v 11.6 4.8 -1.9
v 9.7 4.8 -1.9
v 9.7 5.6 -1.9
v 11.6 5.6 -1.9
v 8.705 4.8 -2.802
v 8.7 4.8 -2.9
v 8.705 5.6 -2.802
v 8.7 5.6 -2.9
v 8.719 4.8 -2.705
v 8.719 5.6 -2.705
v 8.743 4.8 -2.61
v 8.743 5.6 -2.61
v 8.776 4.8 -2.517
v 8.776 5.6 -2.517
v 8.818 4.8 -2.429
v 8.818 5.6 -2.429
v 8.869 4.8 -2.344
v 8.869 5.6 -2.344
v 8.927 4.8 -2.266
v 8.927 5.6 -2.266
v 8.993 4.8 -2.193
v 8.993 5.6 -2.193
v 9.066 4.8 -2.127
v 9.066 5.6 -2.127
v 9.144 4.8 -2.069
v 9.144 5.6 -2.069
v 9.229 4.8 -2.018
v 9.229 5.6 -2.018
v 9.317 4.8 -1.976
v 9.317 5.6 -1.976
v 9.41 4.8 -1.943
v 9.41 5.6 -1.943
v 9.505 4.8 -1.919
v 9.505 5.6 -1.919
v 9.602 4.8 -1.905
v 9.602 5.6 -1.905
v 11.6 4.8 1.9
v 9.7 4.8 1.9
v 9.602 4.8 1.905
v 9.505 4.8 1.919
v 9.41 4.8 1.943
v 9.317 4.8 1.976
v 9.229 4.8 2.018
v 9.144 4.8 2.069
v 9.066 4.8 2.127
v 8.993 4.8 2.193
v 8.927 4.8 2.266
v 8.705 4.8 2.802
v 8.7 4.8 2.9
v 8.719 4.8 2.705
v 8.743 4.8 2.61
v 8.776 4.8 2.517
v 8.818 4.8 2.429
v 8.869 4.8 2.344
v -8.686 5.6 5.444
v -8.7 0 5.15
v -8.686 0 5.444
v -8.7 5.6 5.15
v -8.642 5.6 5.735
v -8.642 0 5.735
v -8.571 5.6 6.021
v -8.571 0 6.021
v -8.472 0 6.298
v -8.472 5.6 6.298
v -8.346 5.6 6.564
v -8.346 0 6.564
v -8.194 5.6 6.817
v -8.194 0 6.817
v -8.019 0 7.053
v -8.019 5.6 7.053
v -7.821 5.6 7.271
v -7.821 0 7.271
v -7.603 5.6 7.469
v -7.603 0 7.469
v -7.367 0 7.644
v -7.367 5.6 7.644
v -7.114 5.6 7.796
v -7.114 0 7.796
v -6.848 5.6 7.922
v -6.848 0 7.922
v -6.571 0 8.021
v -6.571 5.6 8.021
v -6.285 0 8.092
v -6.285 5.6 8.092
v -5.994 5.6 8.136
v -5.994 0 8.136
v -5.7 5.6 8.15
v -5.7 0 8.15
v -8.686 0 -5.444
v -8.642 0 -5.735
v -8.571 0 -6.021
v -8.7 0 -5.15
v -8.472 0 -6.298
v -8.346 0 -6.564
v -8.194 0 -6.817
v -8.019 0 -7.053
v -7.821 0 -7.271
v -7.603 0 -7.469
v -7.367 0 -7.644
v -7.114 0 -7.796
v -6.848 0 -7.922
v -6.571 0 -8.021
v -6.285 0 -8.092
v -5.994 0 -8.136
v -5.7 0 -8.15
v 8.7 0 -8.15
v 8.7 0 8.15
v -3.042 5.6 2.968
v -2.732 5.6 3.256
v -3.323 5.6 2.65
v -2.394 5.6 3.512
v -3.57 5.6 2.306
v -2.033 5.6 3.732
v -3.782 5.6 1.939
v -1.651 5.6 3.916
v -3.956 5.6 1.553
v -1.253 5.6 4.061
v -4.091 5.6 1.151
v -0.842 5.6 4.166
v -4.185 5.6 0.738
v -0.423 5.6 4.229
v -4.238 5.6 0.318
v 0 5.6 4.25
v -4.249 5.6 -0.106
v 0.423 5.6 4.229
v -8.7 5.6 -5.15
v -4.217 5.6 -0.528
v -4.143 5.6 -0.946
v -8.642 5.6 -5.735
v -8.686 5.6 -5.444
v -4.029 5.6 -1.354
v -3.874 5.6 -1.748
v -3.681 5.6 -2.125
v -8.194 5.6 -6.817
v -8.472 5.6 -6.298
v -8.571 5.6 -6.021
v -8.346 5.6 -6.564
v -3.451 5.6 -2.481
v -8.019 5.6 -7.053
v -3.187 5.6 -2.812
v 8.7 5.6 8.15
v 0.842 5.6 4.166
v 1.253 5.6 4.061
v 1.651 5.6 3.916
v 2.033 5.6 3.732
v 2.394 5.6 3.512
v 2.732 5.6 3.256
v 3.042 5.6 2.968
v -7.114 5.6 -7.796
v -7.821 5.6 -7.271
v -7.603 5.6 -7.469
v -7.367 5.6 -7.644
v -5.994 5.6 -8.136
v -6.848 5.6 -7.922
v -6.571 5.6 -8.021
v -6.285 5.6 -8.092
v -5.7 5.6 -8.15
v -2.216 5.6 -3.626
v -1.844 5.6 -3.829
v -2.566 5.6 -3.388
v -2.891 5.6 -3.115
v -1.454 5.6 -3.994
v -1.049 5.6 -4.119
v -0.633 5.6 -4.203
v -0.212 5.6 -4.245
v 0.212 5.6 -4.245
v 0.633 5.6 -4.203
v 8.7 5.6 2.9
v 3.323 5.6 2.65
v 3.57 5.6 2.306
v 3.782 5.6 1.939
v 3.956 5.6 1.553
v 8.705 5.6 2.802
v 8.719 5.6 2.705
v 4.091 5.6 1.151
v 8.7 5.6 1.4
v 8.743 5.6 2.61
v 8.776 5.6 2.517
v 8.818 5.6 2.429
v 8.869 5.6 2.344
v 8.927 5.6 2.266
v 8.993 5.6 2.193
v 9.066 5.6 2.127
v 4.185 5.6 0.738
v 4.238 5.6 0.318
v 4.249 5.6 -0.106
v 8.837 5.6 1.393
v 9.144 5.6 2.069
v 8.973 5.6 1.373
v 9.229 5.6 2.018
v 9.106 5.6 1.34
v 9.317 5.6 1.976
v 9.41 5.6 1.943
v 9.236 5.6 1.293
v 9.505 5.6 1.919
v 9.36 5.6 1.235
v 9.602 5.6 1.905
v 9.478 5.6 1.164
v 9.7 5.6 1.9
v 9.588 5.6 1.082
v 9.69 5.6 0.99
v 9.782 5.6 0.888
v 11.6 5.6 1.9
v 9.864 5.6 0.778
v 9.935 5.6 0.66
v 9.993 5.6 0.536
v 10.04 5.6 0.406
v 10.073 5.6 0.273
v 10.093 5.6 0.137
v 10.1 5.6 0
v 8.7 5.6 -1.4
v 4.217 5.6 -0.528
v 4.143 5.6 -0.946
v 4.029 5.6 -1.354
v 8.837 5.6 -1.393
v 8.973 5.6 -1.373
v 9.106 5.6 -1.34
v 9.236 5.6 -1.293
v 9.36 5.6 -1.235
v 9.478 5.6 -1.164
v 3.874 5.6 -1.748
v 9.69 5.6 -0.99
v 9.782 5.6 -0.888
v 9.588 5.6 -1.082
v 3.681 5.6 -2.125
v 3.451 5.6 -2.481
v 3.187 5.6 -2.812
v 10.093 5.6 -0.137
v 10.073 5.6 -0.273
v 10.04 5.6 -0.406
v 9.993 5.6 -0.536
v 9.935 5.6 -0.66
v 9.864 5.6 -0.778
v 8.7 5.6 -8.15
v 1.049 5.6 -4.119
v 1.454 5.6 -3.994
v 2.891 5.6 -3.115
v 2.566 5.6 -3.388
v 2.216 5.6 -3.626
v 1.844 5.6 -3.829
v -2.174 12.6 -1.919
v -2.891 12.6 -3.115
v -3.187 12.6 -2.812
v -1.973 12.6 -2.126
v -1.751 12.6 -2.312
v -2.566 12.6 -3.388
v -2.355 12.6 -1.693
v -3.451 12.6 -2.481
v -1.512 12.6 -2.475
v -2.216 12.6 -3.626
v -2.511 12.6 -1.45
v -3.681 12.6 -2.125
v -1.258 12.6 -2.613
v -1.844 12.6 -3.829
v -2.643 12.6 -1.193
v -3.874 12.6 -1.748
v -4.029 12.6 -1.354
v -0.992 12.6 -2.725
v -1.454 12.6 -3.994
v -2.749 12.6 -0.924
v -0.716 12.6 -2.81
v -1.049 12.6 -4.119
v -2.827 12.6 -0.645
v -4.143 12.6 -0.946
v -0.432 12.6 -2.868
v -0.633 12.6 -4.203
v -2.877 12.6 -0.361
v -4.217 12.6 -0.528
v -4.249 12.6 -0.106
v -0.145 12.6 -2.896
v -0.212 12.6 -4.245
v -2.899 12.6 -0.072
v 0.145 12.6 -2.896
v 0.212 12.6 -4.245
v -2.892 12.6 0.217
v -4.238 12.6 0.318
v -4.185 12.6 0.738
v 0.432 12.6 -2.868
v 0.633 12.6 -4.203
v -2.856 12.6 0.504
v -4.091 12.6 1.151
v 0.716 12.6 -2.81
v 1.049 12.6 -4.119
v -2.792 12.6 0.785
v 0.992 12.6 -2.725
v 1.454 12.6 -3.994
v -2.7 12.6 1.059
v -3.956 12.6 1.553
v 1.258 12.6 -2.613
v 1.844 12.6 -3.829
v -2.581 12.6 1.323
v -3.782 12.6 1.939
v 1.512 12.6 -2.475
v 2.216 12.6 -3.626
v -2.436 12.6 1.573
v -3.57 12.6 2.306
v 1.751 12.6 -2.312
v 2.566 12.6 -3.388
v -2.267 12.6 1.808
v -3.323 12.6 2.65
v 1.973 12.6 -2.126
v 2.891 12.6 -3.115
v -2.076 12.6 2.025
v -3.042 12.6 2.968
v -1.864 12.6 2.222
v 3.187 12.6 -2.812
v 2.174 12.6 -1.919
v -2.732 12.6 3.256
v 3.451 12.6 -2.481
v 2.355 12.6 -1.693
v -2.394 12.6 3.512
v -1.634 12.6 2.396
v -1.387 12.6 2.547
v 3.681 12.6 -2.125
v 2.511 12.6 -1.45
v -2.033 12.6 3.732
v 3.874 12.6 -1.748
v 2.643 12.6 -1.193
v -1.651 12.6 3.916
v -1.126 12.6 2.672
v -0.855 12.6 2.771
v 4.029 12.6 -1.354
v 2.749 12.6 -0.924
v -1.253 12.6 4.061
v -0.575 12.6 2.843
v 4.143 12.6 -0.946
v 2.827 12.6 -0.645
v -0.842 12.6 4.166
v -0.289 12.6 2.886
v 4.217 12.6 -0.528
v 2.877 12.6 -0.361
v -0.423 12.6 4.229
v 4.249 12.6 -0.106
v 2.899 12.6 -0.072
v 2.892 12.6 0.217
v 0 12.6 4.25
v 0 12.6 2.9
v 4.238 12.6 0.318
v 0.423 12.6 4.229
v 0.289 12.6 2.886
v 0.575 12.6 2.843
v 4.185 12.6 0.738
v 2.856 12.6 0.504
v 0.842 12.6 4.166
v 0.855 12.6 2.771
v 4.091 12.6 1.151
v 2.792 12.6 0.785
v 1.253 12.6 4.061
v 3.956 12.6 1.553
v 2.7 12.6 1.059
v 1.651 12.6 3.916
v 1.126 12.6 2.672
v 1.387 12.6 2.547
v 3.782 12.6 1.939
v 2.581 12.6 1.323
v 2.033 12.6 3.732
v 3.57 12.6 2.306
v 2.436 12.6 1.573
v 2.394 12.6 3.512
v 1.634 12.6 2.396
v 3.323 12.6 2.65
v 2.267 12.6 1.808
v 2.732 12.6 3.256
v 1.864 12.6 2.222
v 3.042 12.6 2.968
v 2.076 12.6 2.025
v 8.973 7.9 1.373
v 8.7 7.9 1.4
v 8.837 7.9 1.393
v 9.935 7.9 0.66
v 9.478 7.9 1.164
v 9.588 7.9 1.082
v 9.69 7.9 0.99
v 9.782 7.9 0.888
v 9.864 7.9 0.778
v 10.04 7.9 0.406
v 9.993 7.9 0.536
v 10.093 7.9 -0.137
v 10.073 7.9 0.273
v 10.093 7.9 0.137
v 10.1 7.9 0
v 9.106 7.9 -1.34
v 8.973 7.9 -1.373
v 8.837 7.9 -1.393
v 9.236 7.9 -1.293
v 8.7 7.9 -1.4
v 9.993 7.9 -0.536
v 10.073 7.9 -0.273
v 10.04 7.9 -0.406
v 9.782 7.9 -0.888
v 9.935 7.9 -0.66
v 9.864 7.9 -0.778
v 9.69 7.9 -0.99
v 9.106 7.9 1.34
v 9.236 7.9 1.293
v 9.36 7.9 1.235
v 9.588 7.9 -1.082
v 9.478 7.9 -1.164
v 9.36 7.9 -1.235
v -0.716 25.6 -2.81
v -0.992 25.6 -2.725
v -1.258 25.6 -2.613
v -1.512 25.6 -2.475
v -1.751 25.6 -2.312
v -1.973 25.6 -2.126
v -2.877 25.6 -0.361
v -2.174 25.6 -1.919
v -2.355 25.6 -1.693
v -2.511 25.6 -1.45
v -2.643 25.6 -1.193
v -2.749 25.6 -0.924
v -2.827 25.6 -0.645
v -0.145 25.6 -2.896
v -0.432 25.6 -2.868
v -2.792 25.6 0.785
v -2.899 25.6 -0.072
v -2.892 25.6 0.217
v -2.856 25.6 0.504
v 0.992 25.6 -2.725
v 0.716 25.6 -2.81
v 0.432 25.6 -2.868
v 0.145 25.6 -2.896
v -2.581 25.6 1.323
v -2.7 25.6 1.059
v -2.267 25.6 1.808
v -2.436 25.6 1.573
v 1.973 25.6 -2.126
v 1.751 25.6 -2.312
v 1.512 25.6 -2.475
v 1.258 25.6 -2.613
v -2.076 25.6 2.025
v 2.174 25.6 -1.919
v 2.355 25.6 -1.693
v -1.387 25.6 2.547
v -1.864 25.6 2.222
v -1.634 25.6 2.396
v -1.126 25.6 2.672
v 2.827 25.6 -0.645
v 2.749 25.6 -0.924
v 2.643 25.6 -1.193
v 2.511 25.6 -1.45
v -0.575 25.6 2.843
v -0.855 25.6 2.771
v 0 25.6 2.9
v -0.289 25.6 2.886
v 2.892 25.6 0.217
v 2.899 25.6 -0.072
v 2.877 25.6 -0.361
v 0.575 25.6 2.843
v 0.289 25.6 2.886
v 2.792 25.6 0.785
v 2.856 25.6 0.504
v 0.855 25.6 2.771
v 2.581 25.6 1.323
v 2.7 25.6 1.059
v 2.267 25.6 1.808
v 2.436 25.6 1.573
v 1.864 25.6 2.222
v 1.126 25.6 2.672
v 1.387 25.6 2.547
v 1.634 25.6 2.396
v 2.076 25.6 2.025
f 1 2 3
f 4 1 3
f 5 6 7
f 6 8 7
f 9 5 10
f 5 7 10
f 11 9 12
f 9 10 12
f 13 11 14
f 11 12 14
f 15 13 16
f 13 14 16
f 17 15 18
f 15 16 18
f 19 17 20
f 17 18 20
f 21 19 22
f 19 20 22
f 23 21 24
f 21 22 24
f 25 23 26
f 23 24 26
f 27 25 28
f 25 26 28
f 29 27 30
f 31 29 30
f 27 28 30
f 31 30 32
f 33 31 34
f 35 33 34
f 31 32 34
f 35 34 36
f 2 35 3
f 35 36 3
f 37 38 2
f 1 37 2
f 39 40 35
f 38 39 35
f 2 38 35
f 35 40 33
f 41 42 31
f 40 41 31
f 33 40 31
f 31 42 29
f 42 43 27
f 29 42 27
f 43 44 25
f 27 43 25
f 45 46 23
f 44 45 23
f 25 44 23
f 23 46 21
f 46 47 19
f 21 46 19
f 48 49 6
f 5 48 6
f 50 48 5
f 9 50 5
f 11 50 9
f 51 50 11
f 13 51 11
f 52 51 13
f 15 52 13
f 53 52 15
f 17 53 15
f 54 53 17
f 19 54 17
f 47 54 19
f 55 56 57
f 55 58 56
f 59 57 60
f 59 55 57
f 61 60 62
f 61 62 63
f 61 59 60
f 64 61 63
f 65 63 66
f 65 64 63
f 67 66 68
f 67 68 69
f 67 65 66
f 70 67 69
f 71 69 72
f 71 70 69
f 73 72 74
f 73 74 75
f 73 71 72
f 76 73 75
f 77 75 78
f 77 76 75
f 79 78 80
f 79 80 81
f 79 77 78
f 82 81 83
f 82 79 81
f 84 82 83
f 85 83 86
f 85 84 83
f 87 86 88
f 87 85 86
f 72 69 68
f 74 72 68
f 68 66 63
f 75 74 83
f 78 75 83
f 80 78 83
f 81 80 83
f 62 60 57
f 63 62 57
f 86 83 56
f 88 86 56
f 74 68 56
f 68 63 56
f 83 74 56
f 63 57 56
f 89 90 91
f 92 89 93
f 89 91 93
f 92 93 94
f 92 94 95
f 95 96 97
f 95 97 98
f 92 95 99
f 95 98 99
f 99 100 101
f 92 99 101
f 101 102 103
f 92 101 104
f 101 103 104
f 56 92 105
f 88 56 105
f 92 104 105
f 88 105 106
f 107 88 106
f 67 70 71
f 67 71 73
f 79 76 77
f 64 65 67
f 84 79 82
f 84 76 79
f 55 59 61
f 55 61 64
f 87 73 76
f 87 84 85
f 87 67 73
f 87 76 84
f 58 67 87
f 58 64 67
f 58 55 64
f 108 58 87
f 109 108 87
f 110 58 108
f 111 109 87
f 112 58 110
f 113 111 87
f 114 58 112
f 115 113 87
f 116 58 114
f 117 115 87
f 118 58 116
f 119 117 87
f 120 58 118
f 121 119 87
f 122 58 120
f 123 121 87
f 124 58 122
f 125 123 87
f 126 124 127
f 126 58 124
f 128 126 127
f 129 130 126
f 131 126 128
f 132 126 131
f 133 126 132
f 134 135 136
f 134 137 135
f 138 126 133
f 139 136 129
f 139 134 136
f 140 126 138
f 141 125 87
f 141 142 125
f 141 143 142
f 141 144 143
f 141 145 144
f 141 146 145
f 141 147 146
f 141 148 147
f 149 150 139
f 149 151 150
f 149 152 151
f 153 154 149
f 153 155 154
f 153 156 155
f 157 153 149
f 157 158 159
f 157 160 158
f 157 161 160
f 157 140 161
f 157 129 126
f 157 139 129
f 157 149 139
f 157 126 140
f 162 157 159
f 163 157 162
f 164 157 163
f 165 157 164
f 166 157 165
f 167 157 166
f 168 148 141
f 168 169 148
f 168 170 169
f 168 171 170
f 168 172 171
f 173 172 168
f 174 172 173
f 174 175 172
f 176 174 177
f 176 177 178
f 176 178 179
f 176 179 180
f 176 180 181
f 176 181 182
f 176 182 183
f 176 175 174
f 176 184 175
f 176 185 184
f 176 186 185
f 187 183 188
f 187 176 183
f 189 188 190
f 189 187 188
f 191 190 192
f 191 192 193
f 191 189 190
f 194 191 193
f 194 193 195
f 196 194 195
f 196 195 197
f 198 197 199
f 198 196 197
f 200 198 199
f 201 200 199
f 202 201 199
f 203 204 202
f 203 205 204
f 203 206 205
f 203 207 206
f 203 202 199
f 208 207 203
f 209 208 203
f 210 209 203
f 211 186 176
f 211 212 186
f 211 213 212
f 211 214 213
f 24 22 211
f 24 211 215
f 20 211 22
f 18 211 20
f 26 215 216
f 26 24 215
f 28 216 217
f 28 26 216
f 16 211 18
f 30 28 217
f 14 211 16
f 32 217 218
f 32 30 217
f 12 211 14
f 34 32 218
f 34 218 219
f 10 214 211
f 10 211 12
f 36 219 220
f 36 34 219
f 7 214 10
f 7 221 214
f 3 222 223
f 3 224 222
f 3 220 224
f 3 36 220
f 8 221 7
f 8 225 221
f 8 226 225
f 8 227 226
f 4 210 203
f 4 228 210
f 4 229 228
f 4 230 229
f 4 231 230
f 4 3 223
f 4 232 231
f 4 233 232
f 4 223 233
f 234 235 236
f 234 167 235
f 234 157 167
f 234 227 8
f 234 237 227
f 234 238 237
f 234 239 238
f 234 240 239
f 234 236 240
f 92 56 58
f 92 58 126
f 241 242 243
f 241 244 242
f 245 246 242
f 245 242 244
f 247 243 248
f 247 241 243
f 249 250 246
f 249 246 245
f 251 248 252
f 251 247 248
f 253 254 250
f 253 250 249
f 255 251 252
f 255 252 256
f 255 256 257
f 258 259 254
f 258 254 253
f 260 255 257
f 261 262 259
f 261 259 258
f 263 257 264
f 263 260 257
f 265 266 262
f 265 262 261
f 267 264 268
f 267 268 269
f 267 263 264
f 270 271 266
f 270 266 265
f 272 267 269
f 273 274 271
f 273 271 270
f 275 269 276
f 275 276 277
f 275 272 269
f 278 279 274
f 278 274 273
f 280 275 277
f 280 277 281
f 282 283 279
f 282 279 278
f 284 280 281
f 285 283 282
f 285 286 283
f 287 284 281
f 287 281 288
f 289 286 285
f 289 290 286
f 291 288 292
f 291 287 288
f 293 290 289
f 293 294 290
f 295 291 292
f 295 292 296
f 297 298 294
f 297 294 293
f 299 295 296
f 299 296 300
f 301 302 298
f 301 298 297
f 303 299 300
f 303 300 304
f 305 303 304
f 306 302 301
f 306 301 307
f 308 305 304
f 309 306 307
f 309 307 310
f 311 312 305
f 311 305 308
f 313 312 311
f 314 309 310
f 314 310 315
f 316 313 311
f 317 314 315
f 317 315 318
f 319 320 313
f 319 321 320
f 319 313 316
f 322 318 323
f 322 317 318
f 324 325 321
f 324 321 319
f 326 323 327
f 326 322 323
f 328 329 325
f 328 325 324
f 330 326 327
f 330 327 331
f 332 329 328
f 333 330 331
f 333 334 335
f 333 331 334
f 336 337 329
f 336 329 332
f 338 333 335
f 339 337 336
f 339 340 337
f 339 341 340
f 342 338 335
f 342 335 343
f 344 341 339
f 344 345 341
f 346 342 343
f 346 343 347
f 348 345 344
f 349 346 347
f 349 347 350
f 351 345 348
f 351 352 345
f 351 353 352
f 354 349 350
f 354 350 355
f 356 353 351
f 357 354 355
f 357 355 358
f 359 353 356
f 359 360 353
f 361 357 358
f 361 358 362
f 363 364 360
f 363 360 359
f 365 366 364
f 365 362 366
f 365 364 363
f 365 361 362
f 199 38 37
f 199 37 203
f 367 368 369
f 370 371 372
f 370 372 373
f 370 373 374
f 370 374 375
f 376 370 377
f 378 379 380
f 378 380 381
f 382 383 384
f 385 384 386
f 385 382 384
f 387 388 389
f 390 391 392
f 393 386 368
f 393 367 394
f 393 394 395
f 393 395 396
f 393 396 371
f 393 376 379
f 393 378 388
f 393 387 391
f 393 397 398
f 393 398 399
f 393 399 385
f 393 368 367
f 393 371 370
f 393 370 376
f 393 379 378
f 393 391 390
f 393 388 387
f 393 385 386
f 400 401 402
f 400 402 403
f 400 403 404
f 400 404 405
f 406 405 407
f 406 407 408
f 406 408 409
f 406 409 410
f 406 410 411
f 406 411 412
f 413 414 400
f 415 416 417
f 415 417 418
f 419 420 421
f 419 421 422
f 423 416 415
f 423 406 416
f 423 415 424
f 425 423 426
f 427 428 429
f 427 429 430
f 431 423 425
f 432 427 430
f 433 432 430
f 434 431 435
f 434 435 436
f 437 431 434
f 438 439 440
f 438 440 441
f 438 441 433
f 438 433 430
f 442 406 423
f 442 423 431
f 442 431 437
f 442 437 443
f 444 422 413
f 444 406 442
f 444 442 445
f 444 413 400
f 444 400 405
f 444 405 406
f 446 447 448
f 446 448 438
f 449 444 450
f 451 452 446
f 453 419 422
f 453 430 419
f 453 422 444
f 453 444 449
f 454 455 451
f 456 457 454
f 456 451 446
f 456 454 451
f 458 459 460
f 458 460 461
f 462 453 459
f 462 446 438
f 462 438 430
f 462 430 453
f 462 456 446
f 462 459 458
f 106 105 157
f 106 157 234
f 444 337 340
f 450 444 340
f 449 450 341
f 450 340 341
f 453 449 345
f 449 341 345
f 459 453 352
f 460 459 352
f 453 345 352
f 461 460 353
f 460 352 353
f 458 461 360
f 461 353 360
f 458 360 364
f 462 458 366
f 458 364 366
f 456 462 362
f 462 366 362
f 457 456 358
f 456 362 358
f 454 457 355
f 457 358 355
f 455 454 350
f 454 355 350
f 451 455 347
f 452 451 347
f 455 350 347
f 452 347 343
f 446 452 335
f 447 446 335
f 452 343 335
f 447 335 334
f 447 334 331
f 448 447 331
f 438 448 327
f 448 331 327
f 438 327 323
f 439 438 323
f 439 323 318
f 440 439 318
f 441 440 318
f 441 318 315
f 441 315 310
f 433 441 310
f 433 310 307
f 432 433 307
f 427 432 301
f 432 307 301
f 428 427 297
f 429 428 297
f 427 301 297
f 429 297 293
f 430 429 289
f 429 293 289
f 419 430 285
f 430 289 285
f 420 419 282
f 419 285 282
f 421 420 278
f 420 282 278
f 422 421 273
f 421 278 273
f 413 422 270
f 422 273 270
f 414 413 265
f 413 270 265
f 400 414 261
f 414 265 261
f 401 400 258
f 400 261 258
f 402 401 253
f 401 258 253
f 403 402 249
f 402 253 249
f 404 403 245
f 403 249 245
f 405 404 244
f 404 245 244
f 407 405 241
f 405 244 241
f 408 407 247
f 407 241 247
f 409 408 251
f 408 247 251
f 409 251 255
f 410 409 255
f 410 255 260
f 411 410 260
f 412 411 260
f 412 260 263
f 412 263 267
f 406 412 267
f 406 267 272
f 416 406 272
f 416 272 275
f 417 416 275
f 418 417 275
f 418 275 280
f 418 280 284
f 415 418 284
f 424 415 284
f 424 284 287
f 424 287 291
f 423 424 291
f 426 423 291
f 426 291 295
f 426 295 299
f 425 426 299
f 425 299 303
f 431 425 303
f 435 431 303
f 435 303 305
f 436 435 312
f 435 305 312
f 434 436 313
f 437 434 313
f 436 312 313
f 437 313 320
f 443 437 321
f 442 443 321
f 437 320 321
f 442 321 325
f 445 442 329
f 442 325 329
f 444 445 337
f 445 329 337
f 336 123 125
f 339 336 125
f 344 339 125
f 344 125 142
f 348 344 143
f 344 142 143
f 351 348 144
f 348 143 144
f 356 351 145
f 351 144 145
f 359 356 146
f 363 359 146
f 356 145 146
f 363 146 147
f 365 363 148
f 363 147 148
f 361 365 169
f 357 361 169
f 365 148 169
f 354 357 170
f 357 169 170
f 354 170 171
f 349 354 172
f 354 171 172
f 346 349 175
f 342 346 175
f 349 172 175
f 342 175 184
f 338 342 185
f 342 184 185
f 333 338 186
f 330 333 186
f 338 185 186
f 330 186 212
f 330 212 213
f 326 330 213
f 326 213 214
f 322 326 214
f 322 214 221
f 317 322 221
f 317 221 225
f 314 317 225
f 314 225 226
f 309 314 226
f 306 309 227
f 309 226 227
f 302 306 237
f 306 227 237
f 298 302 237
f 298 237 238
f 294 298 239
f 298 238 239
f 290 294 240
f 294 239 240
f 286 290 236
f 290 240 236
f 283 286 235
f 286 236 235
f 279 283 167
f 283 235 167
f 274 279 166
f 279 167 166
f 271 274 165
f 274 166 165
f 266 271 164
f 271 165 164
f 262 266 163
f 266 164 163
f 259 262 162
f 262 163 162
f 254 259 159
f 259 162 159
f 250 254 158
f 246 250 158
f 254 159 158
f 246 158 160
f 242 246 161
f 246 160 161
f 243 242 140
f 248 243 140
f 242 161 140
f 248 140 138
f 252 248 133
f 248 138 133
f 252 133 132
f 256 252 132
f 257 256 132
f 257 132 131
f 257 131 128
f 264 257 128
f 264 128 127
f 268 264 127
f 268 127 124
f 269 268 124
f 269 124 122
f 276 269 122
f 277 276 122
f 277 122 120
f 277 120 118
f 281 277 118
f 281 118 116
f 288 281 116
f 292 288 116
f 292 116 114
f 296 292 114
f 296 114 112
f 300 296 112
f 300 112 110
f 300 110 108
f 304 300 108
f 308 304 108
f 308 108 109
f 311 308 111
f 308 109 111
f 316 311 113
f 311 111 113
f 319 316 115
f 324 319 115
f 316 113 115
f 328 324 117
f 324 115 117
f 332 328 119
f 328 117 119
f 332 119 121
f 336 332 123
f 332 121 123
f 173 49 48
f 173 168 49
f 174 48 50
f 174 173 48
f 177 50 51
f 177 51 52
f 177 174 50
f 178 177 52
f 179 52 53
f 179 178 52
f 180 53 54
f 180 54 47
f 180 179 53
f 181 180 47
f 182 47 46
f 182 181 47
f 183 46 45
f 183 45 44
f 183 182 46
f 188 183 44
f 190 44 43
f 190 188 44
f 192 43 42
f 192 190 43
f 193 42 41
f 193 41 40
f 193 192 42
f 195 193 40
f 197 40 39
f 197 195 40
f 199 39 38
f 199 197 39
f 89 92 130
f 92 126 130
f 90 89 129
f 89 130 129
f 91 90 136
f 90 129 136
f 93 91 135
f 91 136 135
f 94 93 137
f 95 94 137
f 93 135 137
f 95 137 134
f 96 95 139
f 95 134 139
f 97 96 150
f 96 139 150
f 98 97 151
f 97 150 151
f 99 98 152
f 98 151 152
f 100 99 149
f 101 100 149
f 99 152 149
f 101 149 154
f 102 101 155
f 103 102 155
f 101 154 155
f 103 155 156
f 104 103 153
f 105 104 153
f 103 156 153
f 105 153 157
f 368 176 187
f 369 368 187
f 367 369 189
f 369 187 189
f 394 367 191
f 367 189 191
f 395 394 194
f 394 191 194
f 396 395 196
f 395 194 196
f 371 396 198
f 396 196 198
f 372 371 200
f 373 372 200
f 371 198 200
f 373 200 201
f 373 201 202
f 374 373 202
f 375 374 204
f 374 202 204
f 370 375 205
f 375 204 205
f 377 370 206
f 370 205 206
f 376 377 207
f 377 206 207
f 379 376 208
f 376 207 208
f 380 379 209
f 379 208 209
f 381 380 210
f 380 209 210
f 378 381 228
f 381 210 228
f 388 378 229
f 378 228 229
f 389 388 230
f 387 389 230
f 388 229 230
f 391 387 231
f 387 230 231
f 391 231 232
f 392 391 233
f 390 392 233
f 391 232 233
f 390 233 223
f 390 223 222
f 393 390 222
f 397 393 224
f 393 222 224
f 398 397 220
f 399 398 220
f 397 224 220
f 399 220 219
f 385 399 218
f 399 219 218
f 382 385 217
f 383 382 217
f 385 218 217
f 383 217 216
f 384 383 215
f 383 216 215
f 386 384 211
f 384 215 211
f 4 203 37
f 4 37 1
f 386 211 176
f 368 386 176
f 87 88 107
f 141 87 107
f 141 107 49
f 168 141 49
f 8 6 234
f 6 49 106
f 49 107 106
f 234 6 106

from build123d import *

# Parameters (mm, degrees)
SKETCH1_W           = 17.4
SKETCH1_H           = 16.3
BOSS_EXTRUDE1_DEPTH = 5.6
SKETCH2_R           = 4.25
BOSS_EXTRUDE2_DEPTH = 7
SKETCH3_R           = 2.9
BOSS_EXTRUDE3_DEPTH = 13
FILLET1_R           = 3
SKETCH4_W           = 3.8
SKETCH4_H           = 0.8
BOSS_EXTRUDE4_DEPTH = 2.9
FILLET2_R           = 1
BOSS_EXTRUDE5_DEPTH = 2.3


with BuildPart() as part:
    # Sketch1 → Boss-Extrude1 (new body)
    with BuildSketch(Plane(origin=(0, 0, 0), x_dir=(1, 0, 0), z_dir=(0, 1, 0))):
        Rectangle(SKETCH1_W, SKETCH1_H)
    extrude(amount=BOSS_EXTRUDE1_DEPTH)

    # Sketch2 → Boss-Extrude2 (add)
    with BuildSketch(Plane(origin=(0, 5.6, 0), x_dir=(1, 0, 0), z_dir=(0, 1, 0))):
        with Locations(Location((0, 0, 0), (0, 0, 270))):  # turned: the seam where the file's is
            Circle(SKETCH2_R)
    extrude(amount=BOSS_EXTRUDE2_DEPTH)

    # Sketch3 → Boss-Extrude3 (add)
    with BuildSketch(Plane(origin=(0, 12.6, 0), x_dir=(1, 0, 0), z_dir=(0, 1, 0))):
        with Locations(Location((0, 0, 0), (0, 0, 270))):  # turned: the seam where the file's is
            Circle(SKETCH3_R)
    extrude(amount=BOSS_EXTRUDE3_DEPTH)

    # Fillet1
    fillet1_edges = [part.edges().sort_by_distance(p)[0] for p in [
        (-8.7, 2.8, -8.15),
        (-8.7, 2.8, 8.15),
    ]]
    fillet(fillet1_edges, radius=FILLET1_R)

    # Sketch4 → Boss-Extrude4 (add)
    with BuildSketch(Plane(origin=(8.7, 0, 0), x_dir=(0, 0, -1), z_dir=(1, 0, 0))):
        with Locations((0, 5.2)):
            Rectangle(SKETCH4_W, SKETCH4_H)
    extrude(amount=BOSS_EXTRUDE4_DEPTH)

    # Fillet2
    fillet2_edges = [part.edges().sort_by_distance(p)[0] for p in [
        (8.7, 5.2, -1.9),
        (8.7, 5.2, 1.9),
    ]]
    fillet(fillet2_edges, radius=FILLET2_R)

    # Sketch5 → Boss-Extrude5 (add)
    with BuildSketch(Plane(origin=(0, 5.6, 0), x_dir=(1, 0, 0), z_dir=(0, 1, 0))):
        with BuildLine():
            Line((8.7, 1.4), (8.7, -1.4))
            ThreePointArc((8.7, -1.4), (10.1, 0), (8.7, 1.4))
        make_face()
    extrude(amount=BOSS_EXTRUDE5_DEPTH)


solid = part.part
